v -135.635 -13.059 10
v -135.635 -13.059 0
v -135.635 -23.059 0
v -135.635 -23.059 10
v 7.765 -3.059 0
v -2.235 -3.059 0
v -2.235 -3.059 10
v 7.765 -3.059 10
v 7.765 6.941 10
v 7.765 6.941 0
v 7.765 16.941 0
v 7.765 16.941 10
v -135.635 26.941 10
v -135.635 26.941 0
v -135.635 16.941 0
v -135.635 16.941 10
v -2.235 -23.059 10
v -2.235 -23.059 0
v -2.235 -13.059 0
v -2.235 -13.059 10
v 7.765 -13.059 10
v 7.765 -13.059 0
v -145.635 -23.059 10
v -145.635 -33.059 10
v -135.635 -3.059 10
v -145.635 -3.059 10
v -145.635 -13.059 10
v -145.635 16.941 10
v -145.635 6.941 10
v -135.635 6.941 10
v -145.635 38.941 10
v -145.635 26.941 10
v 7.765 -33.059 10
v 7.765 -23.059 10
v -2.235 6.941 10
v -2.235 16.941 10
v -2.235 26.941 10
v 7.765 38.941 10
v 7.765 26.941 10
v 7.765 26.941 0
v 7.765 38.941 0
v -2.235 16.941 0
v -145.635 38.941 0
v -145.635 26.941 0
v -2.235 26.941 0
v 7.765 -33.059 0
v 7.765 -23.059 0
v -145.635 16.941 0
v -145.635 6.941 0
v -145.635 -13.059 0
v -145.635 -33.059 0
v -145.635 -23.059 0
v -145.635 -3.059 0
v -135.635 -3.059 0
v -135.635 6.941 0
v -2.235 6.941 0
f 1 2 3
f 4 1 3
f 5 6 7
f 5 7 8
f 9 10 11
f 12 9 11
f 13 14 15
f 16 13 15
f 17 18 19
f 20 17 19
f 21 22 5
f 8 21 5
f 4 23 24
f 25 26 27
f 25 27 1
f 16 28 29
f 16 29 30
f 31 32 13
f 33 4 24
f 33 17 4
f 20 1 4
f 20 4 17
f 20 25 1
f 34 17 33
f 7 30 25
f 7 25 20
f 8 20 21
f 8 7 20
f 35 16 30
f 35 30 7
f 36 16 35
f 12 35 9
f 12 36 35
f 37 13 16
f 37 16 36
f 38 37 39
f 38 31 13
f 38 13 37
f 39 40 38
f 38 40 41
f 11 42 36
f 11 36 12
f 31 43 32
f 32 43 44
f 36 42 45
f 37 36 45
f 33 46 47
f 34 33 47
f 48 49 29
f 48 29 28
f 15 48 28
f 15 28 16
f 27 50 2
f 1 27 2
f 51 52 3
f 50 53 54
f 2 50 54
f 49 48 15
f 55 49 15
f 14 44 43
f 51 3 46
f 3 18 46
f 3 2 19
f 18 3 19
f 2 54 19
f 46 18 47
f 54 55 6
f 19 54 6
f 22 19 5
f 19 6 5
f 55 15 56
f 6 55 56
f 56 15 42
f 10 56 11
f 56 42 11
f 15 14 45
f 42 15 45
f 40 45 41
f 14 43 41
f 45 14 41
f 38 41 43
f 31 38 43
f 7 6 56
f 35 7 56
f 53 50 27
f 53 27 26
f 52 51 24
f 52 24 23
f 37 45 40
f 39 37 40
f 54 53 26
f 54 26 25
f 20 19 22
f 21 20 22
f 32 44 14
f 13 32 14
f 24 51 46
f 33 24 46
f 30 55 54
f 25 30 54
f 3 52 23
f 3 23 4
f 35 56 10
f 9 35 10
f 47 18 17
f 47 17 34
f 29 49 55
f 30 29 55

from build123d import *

# Parameters (mm, degrees)
F0_W     = 10
F0_H     = 10
F1_DEPTH = 10


# Not quite as in the source:
# - a feature names something its author has since deleted; it is built from what else it names


with BuildPart() as f1:
    # F0 (on Top) → F1 (new body)
    with BuildSketch(Plane.XY):
        Polygon((-2.2346749902, 36.9413525529), (-135.6346749902, 36.9413525529), (-135.6346749902, 26.9413525529), (-135.6346749902, 16.9413525529), (-135.6346749902, 6.9413525529), (-135.6346749902, -3.0586474471), (-135.6346749902, -13.0586474471), (-135.6346749902, -23.0586474471), (-135.6346749902, -33.0586474471), (-2.2346749902, -33.0586474471), (-2.2346749902, -23.0586474471), (-2.2346749902, -13.0586474471), (-2.2346749902, -3.0586474471), (-2.2346749902, 6.9413525529), (-2.2346749902, 16.9413525529), (-2.2346749902, 26.9413525529), align=None)
        with Locations((-140.6346749902, 31.9413525529)):
            Rectangle(F0_W, F0_H)
        with Locations((-140.6346749902, 11.9413525529)):
            Rectangle(F0_W, F0_H)
        with Locations((-140.6346749902, -8.0586474471)):
            Rectangle(F0_W, F0_H)
        with Locations((-140.6346749902, -28.0586474471)):
            Rectangle(F0_W, F0_H)
        with Locations((2.7653250098, 31.9413525529)):
            Rectangle(F0_W, F0_H)
        with Locations((2.7653250098, 11.9413525529)):
            Rectangle(F0_W, F0_H)
        with Locations((2.7653250098, -8.0586474471)):
            Rectangle(F0_W, F0_H)
        with Locations((2.7653250098, -28.0586474471)):
            Rectangle(F0_W, F0_H)
        Polygon((-145.6346749902, 38.9413525529), (-145.6346749902, 36.9413525529), (-135.6346749902, 36.9413525529), (-2.2346749902, 36.9413525529), (7.7653250098, 36.9413525529), (7.7653250098, 38.9413525529), align=None)
    extrude(amount=F1_DEPTH)


solid = f1.part
